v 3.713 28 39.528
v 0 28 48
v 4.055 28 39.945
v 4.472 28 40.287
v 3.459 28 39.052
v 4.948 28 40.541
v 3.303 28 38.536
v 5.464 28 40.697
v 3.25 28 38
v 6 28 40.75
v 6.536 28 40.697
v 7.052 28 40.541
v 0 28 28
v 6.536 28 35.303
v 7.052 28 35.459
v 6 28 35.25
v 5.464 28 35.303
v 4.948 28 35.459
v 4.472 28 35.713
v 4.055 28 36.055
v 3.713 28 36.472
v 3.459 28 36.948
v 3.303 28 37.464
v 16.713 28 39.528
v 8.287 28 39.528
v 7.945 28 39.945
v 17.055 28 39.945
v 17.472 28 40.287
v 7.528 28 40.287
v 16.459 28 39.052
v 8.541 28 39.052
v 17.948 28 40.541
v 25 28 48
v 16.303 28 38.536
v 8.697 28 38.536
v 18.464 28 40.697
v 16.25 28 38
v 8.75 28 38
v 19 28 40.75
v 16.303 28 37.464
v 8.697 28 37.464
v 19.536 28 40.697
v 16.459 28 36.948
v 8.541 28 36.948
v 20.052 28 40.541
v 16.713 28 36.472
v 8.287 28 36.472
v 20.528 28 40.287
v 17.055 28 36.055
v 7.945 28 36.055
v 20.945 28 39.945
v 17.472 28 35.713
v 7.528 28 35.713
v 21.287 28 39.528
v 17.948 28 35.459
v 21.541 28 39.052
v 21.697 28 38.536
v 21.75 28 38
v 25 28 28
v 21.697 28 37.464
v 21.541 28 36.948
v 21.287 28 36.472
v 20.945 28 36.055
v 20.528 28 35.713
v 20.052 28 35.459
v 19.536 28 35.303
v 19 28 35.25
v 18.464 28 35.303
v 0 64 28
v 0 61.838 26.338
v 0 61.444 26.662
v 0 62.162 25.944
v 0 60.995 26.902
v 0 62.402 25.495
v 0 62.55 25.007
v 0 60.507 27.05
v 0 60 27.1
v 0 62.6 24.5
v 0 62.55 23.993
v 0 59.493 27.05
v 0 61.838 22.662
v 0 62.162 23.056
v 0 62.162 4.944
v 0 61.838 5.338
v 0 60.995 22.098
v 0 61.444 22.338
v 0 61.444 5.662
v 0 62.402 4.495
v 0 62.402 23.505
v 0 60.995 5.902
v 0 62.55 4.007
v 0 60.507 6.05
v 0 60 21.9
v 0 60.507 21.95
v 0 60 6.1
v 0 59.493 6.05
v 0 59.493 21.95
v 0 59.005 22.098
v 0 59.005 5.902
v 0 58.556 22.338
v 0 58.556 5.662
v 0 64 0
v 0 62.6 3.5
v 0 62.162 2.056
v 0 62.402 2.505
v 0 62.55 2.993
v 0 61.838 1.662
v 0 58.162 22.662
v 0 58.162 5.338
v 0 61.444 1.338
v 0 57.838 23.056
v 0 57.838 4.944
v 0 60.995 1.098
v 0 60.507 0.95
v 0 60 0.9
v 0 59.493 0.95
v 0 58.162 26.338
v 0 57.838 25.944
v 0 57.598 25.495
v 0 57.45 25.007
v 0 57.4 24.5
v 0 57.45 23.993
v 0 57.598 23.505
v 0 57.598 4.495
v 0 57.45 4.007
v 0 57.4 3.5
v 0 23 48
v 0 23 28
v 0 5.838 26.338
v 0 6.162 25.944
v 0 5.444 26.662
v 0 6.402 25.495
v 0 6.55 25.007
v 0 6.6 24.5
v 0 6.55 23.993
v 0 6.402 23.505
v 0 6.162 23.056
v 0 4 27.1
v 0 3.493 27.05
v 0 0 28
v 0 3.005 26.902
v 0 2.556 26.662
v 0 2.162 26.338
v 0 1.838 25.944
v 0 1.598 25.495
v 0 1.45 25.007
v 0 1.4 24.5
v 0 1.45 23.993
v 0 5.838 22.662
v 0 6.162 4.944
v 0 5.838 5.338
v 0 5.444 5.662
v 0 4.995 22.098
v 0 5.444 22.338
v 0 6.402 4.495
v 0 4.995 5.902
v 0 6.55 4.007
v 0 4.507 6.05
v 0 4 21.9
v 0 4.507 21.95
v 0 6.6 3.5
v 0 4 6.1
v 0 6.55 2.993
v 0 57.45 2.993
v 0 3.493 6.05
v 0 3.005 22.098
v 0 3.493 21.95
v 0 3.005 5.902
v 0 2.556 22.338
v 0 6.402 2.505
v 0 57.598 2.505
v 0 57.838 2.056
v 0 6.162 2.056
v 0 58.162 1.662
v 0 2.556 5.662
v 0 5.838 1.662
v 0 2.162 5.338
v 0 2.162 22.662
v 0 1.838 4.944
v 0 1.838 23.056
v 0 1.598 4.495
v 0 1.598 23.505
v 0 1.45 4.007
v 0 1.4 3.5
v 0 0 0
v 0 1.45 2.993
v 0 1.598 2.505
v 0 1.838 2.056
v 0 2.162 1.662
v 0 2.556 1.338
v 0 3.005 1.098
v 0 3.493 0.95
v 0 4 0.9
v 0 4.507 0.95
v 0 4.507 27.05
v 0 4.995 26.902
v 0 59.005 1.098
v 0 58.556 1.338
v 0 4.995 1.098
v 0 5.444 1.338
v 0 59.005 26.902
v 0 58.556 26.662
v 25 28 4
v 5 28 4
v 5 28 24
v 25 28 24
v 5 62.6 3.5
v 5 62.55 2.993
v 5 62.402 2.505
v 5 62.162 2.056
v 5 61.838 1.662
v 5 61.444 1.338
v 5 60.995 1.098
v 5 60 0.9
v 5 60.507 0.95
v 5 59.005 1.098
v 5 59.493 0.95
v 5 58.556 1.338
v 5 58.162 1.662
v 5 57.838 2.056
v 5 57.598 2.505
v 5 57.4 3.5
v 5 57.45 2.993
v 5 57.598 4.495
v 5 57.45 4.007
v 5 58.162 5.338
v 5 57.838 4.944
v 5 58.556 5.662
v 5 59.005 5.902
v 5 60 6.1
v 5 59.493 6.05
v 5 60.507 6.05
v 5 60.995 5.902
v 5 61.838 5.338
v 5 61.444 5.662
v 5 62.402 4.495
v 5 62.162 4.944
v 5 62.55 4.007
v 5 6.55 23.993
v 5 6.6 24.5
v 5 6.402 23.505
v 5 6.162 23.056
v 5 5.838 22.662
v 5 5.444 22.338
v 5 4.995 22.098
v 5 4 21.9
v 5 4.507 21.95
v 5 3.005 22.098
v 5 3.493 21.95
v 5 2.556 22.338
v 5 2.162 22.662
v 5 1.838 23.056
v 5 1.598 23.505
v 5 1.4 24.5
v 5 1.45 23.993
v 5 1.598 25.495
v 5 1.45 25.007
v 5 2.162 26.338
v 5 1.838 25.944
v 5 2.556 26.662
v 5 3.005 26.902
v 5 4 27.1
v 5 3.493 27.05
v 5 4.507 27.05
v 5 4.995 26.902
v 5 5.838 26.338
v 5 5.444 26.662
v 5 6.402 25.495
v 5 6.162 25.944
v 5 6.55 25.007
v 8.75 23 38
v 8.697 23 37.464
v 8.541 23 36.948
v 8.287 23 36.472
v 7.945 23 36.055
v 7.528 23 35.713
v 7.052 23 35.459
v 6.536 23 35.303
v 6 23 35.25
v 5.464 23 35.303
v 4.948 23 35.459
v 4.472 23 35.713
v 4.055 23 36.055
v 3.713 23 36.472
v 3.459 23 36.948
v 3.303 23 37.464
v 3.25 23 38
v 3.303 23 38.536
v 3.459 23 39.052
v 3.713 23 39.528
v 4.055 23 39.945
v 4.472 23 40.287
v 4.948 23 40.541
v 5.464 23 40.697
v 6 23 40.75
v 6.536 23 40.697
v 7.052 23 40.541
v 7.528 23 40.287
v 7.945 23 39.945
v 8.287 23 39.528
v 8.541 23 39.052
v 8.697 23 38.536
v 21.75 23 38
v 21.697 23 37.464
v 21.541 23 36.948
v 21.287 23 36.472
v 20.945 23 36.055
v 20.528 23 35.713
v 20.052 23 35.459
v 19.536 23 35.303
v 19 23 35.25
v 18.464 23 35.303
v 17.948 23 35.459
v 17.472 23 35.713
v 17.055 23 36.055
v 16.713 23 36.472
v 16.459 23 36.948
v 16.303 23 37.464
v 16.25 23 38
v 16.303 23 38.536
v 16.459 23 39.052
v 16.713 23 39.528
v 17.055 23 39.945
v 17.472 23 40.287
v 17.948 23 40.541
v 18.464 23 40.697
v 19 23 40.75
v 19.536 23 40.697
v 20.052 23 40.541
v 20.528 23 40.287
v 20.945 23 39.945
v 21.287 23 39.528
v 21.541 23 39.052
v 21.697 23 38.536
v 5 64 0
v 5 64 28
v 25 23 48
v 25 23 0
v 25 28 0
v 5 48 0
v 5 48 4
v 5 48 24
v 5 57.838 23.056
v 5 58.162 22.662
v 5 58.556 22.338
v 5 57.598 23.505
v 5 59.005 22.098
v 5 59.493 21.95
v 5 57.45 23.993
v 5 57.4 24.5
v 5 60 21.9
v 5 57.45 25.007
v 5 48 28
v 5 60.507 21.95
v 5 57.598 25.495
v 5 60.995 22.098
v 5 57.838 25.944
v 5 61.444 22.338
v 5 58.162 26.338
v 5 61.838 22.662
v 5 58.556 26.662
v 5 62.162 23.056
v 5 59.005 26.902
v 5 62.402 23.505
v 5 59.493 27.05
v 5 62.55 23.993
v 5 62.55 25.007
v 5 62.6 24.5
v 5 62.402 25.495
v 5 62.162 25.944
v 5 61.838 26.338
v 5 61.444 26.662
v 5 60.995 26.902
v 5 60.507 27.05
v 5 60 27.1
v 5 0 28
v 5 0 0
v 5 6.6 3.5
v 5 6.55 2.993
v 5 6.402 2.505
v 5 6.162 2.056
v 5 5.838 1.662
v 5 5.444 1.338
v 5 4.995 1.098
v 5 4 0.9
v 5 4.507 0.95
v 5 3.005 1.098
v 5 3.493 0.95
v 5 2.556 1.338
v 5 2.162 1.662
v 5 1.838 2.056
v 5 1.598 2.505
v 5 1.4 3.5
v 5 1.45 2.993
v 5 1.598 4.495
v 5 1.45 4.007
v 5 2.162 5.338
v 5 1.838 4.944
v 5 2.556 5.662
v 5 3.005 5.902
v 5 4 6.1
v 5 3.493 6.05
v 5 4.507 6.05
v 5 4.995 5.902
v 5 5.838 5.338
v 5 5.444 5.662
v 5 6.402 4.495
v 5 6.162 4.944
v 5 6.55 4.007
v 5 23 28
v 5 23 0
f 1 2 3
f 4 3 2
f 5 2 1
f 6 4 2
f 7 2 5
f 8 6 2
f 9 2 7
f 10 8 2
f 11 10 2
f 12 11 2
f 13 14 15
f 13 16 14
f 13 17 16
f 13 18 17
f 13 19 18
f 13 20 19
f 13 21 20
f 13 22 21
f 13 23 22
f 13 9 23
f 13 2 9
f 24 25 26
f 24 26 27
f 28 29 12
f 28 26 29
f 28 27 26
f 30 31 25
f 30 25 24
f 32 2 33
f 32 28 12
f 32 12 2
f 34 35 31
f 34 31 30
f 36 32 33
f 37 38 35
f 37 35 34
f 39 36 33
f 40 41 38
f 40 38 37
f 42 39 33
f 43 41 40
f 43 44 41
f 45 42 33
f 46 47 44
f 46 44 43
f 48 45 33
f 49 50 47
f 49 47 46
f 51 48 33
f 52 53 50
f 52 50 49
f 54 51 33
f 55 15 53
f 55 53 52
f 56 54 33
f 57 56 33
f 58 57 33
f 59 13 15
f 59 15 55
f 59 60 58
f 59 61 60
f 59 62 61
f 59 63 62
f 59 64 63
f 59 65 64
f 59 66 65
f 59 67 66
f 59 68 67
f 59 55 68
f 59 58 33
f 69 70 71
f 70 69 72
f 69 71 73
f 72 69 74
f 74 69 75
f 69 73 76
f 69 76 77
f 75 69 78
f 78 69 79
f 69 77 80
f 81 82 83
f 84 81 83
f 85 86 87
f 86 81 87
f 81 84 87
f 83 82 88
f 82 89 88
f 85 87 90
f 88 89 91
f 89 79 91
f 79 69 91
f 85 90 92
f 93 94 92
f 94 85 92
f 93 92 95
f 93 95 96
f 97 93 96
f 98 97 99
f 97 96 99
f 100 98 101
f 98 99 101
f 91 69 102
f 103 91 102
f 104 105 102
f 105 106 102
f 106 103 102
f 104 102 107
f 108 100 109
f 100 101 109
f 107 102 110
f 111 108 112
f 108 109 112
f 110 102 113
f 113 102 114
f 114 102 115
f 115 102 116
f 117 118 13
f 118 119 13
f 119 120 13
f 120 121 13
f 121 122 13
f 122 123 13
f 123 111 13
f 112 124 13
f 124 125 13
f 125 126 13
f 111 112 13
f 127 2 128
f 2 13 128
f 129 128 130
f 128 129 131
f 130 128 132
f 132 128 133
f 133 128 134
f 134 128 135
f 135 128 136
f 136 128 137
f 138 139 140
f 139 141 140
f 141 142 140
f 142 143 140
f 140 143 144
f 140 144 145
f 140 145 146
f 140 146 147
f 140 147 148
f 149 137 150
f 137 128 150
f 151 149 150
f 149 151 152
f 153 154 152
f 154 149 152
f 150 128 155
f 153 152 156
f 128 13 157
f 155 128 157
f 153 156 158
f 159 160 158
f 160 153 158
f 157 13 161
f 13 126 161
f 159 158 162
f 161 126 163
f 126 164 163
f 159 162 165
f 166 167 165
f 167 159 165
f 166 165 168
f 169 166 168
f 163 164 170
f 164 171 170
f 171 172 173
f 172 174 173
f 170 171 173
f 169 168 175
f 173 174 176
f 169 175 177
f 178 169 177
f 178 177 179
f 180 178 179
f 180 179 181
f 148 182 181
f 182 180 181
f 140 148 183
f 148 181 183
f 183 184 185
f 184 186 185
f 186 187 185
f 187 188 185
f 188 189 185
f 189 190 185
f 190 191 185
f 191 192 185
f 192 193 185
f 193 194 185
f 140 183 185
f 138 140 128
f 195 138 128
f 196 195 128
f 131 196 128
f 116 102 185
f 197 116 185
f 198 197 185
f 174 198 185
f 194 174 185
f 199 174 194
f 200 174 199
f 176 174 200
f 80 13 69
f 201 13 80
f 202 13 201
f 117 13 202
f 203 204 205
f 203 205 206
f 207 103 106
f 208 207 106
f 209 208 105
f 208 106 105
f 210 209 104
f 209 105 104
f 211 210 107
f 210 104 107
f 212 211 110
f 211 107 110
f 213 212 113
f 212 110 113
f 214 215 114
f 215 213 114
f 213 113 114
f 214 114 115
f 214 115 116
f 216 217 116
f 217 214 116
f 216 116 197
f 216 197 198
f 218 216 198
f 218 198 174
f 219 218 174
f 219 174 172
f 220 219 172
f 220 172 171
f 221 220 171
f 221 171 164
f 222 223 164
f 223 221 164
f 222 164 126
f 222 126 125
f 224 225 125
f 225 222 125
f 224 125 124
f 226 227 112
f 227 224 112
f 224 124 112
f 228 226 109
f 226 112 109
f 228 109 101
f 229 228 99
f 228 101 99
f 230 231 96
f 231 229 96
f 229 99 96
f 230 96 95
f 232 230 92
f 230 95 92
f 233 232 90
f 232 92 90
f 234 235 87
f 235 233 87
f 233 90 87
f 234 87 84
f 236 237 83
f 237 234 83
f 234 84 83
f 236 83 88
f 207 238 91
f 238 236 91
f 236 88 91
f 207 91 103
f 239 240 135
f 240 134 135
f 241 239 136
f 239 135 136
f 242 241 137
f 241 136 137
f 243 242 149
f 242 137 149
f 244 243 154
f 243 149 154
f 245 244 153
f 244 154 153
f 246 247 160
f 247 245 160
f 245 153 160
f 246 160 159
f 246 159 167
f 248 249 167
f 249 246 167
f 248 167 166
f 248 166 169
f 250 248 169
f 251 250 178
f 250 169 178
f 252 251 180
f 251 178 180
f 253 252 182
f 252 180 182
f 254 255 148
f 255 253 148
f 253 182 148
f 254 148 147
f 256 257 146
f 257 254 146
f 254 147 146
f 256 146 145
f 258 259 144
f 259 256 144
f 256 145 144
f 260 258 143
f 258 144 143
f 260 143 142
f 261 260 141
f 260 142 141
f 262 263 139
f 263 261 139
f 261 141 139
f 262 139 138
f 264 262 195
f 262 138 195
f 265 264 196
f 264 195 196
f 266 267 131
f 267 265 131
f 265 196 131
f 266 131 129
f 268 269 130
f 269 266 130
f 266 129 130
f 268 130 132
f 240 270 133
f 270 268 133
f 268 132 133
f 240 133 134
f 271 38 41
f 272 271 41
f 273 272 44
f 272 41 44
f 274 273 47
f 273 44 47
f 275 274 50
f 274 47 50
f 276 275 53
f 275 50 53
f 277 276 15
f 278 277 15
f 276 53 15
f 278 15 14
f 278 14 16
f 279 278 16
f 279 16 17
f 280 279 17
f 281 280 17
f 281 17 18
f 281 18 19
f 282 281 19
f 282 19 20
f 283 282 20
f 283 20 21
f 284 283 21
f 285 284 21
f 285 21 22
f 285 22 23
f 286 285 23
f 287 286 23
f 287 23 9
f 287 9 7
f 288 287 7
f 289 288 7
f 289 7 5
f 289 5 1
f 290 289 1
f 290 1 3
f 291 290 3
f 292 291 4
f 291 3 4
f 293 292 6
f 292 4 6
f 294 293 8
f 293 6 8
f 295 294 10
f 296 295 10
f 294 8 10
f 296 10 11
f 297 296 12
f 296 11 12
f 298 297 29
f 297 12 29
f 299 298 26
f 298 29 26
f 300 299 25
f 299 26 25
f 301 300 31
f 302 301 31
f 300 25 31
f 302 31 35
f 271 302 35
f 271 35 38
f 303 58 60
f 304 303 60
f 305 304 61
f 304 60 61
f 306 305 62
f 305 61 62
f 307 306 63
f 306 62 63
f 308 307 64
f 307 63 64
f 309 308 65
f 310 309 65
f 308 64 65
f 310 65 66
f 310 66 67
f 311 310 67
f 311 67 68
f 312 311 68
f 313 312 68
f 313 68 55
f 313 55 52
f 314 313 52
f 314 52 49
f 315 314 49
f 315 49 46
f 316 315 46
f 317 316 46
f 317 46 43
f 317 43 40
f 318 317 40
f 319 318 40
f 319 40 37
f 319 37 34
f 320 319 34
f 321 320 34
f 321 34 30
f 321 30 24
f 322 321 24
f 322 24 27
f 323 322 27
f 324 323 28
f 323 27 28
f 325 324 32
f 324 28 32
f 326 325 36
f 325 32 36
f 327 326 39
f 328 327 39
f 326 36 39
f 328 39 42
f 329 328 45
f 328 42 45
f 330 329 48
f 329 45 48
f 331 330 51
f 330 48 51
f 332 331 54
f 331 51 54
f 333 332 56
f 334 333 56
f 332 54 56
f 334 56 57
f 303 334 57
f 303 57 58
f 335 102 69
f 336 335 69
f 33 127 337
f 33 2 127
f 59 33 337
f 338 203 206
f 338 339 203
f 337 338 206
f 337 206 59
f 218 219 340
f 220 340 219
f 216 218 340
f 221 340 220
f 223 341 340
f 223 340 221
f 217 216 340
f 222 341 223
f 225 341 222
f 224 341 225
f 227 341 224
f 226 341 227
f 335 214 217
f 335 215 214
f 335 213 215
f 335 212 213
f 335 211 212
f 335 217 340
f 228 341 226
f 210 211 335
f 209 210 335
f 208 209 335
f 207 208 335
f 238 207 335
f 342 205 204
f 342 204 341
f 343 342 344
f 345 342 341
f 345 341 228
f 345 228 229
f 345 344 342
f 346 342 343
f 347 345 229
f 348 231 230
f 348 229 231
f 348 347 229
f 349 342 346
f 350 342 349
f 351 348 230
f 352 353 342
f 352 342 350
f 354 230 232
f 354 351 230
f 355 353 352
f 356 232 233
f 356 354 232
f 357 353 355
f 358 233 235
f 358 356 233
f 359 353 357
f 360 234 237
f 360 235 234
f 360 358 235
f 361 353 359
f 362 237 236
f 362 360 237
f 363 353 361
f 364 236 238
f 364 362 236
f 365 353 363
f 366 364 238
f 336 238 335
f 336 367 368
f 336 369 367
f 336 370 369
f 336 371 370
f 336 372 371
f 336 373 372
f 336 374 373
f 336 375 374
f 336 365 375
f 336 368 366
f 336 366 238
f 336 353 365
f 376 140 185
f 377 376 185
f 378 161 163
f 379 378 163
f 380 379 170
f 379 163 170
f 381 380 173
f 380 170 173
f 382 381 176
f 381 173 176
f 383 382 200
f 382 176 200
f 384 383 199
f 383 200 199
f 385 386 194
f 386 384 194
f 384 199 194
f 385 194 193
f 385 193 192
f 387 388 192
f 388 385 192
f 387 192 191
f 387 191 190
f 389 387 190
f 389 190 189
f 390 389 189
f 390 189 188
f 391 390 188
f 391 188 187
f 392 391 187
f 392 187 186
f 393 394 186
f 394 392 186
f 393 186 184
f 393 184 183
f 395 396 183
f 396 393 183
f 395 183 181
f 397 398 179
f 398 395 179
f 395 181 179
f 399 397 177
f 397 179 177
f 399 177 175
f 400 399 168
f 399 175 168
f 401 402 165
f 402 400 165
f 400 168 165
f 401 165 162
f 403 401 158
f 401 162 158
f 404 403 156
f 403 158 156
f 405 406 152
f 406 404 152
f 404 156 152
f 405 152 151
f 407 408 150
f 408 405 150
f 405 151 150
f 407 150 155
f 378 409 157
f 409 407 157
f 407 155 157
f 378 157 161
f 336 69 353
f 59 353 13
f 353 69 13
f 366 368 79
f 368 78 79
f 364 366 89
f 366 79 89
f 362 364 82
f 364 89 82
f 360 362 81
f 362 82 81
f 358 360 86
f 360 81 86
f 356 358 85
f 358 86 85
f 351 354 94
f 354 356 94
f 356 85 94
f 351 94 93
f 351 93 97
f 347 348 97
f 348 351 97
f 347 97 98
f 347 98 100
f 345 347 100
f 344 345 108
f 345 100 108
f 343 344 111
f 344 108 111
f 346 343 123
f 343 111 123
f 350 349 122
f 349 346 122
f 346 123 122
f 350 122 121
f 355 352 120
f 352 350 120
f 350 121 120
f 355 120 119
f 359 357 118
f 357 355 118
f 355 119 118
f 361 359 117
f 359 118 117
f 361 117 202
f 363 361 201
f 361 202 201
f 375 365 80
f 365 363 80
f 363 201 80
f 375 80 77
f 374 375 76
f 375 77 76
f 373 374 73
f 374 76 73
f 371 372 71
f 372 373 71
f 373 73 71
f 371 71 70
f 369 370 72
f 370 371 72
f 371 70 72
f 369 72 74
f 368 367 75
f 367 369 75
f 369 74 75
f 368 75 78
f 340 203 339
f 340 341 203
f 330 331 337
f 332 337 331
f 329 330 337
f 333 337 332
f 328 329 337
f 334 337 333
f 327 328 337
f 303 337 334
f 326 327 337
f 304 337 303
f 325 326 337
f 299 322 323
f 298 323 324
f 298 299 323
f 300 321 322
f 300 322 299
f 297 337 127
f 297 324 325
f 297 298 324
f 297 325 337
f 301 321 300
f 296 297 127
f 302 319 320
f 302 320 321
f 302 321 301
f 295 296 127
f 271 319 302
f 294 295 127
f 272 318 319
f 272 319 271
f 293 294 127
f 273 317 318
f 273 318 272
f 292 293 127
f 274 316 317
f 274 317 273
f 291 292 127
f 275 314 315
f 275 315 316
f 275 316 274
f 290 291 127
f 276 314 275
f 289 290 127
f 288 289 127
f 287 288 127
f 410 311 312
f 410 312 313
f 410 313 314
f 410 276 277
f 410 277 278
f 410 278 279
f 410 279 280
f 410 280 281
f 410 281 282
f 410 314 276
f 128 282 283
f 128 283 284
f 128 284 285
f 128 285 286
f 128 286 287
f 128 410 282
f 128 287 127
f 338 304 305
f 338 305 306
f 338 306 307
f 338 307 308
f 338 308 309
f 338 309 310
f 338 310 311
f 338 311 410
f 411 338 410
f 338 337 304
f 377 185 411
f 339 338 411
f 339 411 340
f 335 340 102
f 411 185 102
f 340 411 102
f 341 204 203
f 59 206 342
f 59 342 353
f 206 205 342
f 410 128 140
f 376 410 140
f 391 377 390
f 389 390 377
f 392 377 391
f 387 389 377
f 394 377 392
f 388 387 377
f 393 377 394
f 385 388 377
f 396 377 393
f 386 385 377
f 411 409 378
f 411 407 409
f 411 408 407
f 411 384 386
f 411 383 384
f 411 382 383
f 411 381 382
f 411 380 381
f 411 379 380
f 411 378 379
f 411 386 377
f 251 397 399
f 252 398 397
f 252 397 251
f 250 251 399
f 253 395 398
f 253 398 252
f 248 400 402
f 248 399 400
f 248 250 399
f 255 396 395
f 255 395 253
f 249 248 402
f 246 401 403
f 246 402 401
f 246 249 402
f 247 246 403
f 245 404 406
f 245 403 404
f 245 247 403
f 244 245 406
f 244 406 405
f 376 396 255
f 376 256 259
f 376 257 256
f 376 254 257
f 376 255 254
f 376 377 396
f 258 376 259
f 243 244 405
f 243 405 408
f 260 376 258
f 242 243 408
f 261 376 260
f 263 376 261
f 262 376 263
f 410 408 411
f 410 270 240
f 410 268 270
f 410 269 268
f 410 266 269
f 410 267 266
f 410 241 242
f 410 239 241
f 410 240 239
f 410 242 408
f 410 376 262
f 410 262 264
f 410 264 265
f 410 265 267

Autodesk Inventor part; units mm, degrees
ref_plane "YZ Plane" through (0, 0, 0) normal (1, 0, 0) x (0, 1, 0)
ref_plane "XZ Plane" through (0, 0, 0) normal (0, 1, 0) x (-1, 0, 0)
ref_plane "XY Plane" through (0, 0, 0) normal (0, 0, 1) x (1, 0, 0)
sketch "Sketch1" plane through (0, 0, 0) normal (1, 0, 0) x (0, 1, 0)
  line L0 (0, 0) -> (64, 0)
  line L1 (64, 0) -> (64, 28)
  line L2 (64, 28) -> (0, 28)
  line L3 (0, 28) -> (0, 0)
  line L4 (60, 24.5) -> (4, 24.5) construction
  line L5 (4, 24.5) -> (4, 3.5) construction
  line L6 (4, 3.5) -> (60, 3.5) construction
  line L7 (60, 3.5) -> (60, 24.5) construction
  line L8 (60, 24.5) -> (64, 24.5) construction
  line L9 (60, 24.5) -> (60, 28) construction
  line L10 (4, 3.5) -> (0, 3.5) construction
  line L11 (4, 3.5) -> (4, 0) construction
  circle A0 centre (60, 24.5) radius 2.6
  circle A1 centre (60, 3.5) radius 2.6
  circle A2 centre (4, 3.5) radius 2.6
  circle A3 centre (4, 24.5) radius 2.6
  dimension "d0" = 64
  dimension "d1" = 28
  dimension "d2" = 56
  dimension "d3" = 21
  dimension "d4" = 5.2
  dimension "d5" = 5.2
  dimension "d6" = 5.2
  dimension "d7" = 5.2
extrude "Extrusion1" add sketch "Sketch1" along normal blind 5
sketch "Sketch2" plane through (5, 0, 0) normal (1, 0, 0) x (0, 0, -1)
  line L0 (0, 0) -> (0, 64) projected
  line L1 (-28, 64) -> (-28, 0) projected
  line L2 (0, 23) -> (-28, 23)
  line L3 (-28, 23) -> (-28, 28)
  line L4 (-28, 28) -> (0, 28)
  line L5 (0, 28) -> (0, 23)
  line L6 (0, 64) -> (-28, 64) projected
  point P0 (0, 28)
  dimension "d10" = 41
  dimension "d11" = 5
extrude "Extrusion2" add sketch "Sketch2" along normal blind 20 contours L2 L1 L4 L0
sketch "Sketch3" plane through (0, 0, 28) normal (0, 0, 1) x (1, 0, 0)
  line L0 (5, 23) -> (25, 23) projected
  line L1 (0, 64) -> (0, 0) projected
  line L2 (25, 23) -> (0, 23)
  line L3 (0, 23) -> (0, 28)
  line L4 (0, 28) -> (25, 28)
  line L5 (25, 28) -> (25, 23)
  dimension "d14" = 5
extrude "Extrusion3" add sketch "Sketch3" along normal blind 20
sketch "Sketch4" plane through (0, 28, 48) normal (0, 1, 0) x (1, 0, 0)
  line L0 (0, 20) -> (0, 0) construction
  line L1 (0, 10) -> (25, 10) construction
  line L2 (25, 20) -> (25, 0) construction
  circle A0 centre (6, 10) radius 2.75
  circle A1 centre (19, 10) radius 2.75
  point P0 (0, 48)
  dimension "d20" = 5.5
  dimension "d21" = 5.5
  dimension "d22" = 6
  dimension "d24" = 6
extrude "Extrusion4" cut sketch "Sketch4" against normal up to next
sketch "Sketch7" plane through (5, 0, 0) normal (1, 0, 0) x (0, 0, -1)
  line L0 (-28, 28) -> (0, 28) projected
  line L1 (0, 28) -> (-4, 28)
  line L2 (-4, 28) -> (-4, 48)
  line L3 (-4, 48) -> (0, 48)
  line L4 (0, 48) -> (0, 28)
  line L5 (-28, 64) -> (-28, 28) projected
  line L6 (-28, 28) -> (-24, 28)
  line L7 (-24, 28) -> (-24, 48)
  line L8 (-24, 48) -> (-28, 48)
  line L9 (-28, 48) -> (-28, 28)
  point P0 (0, 0)
  dimension "d27" = 4
  dimension "d28" = 20
  dimension "d29" = 4
extrude "Extrusion5" add sketch "Sketch7" along normal blind 20
chamfer "Chamfer2" distance 20 angle 45 2 edges at (25, 48, 2) (25, 48, 26)
equation "\"d5\" = d4"
equation "\"d6\" = d4"
equation "\"d7\" = d4"
equation "\"d24\" = d22"
properties part number "X Axis Limit Switch Bracket"
